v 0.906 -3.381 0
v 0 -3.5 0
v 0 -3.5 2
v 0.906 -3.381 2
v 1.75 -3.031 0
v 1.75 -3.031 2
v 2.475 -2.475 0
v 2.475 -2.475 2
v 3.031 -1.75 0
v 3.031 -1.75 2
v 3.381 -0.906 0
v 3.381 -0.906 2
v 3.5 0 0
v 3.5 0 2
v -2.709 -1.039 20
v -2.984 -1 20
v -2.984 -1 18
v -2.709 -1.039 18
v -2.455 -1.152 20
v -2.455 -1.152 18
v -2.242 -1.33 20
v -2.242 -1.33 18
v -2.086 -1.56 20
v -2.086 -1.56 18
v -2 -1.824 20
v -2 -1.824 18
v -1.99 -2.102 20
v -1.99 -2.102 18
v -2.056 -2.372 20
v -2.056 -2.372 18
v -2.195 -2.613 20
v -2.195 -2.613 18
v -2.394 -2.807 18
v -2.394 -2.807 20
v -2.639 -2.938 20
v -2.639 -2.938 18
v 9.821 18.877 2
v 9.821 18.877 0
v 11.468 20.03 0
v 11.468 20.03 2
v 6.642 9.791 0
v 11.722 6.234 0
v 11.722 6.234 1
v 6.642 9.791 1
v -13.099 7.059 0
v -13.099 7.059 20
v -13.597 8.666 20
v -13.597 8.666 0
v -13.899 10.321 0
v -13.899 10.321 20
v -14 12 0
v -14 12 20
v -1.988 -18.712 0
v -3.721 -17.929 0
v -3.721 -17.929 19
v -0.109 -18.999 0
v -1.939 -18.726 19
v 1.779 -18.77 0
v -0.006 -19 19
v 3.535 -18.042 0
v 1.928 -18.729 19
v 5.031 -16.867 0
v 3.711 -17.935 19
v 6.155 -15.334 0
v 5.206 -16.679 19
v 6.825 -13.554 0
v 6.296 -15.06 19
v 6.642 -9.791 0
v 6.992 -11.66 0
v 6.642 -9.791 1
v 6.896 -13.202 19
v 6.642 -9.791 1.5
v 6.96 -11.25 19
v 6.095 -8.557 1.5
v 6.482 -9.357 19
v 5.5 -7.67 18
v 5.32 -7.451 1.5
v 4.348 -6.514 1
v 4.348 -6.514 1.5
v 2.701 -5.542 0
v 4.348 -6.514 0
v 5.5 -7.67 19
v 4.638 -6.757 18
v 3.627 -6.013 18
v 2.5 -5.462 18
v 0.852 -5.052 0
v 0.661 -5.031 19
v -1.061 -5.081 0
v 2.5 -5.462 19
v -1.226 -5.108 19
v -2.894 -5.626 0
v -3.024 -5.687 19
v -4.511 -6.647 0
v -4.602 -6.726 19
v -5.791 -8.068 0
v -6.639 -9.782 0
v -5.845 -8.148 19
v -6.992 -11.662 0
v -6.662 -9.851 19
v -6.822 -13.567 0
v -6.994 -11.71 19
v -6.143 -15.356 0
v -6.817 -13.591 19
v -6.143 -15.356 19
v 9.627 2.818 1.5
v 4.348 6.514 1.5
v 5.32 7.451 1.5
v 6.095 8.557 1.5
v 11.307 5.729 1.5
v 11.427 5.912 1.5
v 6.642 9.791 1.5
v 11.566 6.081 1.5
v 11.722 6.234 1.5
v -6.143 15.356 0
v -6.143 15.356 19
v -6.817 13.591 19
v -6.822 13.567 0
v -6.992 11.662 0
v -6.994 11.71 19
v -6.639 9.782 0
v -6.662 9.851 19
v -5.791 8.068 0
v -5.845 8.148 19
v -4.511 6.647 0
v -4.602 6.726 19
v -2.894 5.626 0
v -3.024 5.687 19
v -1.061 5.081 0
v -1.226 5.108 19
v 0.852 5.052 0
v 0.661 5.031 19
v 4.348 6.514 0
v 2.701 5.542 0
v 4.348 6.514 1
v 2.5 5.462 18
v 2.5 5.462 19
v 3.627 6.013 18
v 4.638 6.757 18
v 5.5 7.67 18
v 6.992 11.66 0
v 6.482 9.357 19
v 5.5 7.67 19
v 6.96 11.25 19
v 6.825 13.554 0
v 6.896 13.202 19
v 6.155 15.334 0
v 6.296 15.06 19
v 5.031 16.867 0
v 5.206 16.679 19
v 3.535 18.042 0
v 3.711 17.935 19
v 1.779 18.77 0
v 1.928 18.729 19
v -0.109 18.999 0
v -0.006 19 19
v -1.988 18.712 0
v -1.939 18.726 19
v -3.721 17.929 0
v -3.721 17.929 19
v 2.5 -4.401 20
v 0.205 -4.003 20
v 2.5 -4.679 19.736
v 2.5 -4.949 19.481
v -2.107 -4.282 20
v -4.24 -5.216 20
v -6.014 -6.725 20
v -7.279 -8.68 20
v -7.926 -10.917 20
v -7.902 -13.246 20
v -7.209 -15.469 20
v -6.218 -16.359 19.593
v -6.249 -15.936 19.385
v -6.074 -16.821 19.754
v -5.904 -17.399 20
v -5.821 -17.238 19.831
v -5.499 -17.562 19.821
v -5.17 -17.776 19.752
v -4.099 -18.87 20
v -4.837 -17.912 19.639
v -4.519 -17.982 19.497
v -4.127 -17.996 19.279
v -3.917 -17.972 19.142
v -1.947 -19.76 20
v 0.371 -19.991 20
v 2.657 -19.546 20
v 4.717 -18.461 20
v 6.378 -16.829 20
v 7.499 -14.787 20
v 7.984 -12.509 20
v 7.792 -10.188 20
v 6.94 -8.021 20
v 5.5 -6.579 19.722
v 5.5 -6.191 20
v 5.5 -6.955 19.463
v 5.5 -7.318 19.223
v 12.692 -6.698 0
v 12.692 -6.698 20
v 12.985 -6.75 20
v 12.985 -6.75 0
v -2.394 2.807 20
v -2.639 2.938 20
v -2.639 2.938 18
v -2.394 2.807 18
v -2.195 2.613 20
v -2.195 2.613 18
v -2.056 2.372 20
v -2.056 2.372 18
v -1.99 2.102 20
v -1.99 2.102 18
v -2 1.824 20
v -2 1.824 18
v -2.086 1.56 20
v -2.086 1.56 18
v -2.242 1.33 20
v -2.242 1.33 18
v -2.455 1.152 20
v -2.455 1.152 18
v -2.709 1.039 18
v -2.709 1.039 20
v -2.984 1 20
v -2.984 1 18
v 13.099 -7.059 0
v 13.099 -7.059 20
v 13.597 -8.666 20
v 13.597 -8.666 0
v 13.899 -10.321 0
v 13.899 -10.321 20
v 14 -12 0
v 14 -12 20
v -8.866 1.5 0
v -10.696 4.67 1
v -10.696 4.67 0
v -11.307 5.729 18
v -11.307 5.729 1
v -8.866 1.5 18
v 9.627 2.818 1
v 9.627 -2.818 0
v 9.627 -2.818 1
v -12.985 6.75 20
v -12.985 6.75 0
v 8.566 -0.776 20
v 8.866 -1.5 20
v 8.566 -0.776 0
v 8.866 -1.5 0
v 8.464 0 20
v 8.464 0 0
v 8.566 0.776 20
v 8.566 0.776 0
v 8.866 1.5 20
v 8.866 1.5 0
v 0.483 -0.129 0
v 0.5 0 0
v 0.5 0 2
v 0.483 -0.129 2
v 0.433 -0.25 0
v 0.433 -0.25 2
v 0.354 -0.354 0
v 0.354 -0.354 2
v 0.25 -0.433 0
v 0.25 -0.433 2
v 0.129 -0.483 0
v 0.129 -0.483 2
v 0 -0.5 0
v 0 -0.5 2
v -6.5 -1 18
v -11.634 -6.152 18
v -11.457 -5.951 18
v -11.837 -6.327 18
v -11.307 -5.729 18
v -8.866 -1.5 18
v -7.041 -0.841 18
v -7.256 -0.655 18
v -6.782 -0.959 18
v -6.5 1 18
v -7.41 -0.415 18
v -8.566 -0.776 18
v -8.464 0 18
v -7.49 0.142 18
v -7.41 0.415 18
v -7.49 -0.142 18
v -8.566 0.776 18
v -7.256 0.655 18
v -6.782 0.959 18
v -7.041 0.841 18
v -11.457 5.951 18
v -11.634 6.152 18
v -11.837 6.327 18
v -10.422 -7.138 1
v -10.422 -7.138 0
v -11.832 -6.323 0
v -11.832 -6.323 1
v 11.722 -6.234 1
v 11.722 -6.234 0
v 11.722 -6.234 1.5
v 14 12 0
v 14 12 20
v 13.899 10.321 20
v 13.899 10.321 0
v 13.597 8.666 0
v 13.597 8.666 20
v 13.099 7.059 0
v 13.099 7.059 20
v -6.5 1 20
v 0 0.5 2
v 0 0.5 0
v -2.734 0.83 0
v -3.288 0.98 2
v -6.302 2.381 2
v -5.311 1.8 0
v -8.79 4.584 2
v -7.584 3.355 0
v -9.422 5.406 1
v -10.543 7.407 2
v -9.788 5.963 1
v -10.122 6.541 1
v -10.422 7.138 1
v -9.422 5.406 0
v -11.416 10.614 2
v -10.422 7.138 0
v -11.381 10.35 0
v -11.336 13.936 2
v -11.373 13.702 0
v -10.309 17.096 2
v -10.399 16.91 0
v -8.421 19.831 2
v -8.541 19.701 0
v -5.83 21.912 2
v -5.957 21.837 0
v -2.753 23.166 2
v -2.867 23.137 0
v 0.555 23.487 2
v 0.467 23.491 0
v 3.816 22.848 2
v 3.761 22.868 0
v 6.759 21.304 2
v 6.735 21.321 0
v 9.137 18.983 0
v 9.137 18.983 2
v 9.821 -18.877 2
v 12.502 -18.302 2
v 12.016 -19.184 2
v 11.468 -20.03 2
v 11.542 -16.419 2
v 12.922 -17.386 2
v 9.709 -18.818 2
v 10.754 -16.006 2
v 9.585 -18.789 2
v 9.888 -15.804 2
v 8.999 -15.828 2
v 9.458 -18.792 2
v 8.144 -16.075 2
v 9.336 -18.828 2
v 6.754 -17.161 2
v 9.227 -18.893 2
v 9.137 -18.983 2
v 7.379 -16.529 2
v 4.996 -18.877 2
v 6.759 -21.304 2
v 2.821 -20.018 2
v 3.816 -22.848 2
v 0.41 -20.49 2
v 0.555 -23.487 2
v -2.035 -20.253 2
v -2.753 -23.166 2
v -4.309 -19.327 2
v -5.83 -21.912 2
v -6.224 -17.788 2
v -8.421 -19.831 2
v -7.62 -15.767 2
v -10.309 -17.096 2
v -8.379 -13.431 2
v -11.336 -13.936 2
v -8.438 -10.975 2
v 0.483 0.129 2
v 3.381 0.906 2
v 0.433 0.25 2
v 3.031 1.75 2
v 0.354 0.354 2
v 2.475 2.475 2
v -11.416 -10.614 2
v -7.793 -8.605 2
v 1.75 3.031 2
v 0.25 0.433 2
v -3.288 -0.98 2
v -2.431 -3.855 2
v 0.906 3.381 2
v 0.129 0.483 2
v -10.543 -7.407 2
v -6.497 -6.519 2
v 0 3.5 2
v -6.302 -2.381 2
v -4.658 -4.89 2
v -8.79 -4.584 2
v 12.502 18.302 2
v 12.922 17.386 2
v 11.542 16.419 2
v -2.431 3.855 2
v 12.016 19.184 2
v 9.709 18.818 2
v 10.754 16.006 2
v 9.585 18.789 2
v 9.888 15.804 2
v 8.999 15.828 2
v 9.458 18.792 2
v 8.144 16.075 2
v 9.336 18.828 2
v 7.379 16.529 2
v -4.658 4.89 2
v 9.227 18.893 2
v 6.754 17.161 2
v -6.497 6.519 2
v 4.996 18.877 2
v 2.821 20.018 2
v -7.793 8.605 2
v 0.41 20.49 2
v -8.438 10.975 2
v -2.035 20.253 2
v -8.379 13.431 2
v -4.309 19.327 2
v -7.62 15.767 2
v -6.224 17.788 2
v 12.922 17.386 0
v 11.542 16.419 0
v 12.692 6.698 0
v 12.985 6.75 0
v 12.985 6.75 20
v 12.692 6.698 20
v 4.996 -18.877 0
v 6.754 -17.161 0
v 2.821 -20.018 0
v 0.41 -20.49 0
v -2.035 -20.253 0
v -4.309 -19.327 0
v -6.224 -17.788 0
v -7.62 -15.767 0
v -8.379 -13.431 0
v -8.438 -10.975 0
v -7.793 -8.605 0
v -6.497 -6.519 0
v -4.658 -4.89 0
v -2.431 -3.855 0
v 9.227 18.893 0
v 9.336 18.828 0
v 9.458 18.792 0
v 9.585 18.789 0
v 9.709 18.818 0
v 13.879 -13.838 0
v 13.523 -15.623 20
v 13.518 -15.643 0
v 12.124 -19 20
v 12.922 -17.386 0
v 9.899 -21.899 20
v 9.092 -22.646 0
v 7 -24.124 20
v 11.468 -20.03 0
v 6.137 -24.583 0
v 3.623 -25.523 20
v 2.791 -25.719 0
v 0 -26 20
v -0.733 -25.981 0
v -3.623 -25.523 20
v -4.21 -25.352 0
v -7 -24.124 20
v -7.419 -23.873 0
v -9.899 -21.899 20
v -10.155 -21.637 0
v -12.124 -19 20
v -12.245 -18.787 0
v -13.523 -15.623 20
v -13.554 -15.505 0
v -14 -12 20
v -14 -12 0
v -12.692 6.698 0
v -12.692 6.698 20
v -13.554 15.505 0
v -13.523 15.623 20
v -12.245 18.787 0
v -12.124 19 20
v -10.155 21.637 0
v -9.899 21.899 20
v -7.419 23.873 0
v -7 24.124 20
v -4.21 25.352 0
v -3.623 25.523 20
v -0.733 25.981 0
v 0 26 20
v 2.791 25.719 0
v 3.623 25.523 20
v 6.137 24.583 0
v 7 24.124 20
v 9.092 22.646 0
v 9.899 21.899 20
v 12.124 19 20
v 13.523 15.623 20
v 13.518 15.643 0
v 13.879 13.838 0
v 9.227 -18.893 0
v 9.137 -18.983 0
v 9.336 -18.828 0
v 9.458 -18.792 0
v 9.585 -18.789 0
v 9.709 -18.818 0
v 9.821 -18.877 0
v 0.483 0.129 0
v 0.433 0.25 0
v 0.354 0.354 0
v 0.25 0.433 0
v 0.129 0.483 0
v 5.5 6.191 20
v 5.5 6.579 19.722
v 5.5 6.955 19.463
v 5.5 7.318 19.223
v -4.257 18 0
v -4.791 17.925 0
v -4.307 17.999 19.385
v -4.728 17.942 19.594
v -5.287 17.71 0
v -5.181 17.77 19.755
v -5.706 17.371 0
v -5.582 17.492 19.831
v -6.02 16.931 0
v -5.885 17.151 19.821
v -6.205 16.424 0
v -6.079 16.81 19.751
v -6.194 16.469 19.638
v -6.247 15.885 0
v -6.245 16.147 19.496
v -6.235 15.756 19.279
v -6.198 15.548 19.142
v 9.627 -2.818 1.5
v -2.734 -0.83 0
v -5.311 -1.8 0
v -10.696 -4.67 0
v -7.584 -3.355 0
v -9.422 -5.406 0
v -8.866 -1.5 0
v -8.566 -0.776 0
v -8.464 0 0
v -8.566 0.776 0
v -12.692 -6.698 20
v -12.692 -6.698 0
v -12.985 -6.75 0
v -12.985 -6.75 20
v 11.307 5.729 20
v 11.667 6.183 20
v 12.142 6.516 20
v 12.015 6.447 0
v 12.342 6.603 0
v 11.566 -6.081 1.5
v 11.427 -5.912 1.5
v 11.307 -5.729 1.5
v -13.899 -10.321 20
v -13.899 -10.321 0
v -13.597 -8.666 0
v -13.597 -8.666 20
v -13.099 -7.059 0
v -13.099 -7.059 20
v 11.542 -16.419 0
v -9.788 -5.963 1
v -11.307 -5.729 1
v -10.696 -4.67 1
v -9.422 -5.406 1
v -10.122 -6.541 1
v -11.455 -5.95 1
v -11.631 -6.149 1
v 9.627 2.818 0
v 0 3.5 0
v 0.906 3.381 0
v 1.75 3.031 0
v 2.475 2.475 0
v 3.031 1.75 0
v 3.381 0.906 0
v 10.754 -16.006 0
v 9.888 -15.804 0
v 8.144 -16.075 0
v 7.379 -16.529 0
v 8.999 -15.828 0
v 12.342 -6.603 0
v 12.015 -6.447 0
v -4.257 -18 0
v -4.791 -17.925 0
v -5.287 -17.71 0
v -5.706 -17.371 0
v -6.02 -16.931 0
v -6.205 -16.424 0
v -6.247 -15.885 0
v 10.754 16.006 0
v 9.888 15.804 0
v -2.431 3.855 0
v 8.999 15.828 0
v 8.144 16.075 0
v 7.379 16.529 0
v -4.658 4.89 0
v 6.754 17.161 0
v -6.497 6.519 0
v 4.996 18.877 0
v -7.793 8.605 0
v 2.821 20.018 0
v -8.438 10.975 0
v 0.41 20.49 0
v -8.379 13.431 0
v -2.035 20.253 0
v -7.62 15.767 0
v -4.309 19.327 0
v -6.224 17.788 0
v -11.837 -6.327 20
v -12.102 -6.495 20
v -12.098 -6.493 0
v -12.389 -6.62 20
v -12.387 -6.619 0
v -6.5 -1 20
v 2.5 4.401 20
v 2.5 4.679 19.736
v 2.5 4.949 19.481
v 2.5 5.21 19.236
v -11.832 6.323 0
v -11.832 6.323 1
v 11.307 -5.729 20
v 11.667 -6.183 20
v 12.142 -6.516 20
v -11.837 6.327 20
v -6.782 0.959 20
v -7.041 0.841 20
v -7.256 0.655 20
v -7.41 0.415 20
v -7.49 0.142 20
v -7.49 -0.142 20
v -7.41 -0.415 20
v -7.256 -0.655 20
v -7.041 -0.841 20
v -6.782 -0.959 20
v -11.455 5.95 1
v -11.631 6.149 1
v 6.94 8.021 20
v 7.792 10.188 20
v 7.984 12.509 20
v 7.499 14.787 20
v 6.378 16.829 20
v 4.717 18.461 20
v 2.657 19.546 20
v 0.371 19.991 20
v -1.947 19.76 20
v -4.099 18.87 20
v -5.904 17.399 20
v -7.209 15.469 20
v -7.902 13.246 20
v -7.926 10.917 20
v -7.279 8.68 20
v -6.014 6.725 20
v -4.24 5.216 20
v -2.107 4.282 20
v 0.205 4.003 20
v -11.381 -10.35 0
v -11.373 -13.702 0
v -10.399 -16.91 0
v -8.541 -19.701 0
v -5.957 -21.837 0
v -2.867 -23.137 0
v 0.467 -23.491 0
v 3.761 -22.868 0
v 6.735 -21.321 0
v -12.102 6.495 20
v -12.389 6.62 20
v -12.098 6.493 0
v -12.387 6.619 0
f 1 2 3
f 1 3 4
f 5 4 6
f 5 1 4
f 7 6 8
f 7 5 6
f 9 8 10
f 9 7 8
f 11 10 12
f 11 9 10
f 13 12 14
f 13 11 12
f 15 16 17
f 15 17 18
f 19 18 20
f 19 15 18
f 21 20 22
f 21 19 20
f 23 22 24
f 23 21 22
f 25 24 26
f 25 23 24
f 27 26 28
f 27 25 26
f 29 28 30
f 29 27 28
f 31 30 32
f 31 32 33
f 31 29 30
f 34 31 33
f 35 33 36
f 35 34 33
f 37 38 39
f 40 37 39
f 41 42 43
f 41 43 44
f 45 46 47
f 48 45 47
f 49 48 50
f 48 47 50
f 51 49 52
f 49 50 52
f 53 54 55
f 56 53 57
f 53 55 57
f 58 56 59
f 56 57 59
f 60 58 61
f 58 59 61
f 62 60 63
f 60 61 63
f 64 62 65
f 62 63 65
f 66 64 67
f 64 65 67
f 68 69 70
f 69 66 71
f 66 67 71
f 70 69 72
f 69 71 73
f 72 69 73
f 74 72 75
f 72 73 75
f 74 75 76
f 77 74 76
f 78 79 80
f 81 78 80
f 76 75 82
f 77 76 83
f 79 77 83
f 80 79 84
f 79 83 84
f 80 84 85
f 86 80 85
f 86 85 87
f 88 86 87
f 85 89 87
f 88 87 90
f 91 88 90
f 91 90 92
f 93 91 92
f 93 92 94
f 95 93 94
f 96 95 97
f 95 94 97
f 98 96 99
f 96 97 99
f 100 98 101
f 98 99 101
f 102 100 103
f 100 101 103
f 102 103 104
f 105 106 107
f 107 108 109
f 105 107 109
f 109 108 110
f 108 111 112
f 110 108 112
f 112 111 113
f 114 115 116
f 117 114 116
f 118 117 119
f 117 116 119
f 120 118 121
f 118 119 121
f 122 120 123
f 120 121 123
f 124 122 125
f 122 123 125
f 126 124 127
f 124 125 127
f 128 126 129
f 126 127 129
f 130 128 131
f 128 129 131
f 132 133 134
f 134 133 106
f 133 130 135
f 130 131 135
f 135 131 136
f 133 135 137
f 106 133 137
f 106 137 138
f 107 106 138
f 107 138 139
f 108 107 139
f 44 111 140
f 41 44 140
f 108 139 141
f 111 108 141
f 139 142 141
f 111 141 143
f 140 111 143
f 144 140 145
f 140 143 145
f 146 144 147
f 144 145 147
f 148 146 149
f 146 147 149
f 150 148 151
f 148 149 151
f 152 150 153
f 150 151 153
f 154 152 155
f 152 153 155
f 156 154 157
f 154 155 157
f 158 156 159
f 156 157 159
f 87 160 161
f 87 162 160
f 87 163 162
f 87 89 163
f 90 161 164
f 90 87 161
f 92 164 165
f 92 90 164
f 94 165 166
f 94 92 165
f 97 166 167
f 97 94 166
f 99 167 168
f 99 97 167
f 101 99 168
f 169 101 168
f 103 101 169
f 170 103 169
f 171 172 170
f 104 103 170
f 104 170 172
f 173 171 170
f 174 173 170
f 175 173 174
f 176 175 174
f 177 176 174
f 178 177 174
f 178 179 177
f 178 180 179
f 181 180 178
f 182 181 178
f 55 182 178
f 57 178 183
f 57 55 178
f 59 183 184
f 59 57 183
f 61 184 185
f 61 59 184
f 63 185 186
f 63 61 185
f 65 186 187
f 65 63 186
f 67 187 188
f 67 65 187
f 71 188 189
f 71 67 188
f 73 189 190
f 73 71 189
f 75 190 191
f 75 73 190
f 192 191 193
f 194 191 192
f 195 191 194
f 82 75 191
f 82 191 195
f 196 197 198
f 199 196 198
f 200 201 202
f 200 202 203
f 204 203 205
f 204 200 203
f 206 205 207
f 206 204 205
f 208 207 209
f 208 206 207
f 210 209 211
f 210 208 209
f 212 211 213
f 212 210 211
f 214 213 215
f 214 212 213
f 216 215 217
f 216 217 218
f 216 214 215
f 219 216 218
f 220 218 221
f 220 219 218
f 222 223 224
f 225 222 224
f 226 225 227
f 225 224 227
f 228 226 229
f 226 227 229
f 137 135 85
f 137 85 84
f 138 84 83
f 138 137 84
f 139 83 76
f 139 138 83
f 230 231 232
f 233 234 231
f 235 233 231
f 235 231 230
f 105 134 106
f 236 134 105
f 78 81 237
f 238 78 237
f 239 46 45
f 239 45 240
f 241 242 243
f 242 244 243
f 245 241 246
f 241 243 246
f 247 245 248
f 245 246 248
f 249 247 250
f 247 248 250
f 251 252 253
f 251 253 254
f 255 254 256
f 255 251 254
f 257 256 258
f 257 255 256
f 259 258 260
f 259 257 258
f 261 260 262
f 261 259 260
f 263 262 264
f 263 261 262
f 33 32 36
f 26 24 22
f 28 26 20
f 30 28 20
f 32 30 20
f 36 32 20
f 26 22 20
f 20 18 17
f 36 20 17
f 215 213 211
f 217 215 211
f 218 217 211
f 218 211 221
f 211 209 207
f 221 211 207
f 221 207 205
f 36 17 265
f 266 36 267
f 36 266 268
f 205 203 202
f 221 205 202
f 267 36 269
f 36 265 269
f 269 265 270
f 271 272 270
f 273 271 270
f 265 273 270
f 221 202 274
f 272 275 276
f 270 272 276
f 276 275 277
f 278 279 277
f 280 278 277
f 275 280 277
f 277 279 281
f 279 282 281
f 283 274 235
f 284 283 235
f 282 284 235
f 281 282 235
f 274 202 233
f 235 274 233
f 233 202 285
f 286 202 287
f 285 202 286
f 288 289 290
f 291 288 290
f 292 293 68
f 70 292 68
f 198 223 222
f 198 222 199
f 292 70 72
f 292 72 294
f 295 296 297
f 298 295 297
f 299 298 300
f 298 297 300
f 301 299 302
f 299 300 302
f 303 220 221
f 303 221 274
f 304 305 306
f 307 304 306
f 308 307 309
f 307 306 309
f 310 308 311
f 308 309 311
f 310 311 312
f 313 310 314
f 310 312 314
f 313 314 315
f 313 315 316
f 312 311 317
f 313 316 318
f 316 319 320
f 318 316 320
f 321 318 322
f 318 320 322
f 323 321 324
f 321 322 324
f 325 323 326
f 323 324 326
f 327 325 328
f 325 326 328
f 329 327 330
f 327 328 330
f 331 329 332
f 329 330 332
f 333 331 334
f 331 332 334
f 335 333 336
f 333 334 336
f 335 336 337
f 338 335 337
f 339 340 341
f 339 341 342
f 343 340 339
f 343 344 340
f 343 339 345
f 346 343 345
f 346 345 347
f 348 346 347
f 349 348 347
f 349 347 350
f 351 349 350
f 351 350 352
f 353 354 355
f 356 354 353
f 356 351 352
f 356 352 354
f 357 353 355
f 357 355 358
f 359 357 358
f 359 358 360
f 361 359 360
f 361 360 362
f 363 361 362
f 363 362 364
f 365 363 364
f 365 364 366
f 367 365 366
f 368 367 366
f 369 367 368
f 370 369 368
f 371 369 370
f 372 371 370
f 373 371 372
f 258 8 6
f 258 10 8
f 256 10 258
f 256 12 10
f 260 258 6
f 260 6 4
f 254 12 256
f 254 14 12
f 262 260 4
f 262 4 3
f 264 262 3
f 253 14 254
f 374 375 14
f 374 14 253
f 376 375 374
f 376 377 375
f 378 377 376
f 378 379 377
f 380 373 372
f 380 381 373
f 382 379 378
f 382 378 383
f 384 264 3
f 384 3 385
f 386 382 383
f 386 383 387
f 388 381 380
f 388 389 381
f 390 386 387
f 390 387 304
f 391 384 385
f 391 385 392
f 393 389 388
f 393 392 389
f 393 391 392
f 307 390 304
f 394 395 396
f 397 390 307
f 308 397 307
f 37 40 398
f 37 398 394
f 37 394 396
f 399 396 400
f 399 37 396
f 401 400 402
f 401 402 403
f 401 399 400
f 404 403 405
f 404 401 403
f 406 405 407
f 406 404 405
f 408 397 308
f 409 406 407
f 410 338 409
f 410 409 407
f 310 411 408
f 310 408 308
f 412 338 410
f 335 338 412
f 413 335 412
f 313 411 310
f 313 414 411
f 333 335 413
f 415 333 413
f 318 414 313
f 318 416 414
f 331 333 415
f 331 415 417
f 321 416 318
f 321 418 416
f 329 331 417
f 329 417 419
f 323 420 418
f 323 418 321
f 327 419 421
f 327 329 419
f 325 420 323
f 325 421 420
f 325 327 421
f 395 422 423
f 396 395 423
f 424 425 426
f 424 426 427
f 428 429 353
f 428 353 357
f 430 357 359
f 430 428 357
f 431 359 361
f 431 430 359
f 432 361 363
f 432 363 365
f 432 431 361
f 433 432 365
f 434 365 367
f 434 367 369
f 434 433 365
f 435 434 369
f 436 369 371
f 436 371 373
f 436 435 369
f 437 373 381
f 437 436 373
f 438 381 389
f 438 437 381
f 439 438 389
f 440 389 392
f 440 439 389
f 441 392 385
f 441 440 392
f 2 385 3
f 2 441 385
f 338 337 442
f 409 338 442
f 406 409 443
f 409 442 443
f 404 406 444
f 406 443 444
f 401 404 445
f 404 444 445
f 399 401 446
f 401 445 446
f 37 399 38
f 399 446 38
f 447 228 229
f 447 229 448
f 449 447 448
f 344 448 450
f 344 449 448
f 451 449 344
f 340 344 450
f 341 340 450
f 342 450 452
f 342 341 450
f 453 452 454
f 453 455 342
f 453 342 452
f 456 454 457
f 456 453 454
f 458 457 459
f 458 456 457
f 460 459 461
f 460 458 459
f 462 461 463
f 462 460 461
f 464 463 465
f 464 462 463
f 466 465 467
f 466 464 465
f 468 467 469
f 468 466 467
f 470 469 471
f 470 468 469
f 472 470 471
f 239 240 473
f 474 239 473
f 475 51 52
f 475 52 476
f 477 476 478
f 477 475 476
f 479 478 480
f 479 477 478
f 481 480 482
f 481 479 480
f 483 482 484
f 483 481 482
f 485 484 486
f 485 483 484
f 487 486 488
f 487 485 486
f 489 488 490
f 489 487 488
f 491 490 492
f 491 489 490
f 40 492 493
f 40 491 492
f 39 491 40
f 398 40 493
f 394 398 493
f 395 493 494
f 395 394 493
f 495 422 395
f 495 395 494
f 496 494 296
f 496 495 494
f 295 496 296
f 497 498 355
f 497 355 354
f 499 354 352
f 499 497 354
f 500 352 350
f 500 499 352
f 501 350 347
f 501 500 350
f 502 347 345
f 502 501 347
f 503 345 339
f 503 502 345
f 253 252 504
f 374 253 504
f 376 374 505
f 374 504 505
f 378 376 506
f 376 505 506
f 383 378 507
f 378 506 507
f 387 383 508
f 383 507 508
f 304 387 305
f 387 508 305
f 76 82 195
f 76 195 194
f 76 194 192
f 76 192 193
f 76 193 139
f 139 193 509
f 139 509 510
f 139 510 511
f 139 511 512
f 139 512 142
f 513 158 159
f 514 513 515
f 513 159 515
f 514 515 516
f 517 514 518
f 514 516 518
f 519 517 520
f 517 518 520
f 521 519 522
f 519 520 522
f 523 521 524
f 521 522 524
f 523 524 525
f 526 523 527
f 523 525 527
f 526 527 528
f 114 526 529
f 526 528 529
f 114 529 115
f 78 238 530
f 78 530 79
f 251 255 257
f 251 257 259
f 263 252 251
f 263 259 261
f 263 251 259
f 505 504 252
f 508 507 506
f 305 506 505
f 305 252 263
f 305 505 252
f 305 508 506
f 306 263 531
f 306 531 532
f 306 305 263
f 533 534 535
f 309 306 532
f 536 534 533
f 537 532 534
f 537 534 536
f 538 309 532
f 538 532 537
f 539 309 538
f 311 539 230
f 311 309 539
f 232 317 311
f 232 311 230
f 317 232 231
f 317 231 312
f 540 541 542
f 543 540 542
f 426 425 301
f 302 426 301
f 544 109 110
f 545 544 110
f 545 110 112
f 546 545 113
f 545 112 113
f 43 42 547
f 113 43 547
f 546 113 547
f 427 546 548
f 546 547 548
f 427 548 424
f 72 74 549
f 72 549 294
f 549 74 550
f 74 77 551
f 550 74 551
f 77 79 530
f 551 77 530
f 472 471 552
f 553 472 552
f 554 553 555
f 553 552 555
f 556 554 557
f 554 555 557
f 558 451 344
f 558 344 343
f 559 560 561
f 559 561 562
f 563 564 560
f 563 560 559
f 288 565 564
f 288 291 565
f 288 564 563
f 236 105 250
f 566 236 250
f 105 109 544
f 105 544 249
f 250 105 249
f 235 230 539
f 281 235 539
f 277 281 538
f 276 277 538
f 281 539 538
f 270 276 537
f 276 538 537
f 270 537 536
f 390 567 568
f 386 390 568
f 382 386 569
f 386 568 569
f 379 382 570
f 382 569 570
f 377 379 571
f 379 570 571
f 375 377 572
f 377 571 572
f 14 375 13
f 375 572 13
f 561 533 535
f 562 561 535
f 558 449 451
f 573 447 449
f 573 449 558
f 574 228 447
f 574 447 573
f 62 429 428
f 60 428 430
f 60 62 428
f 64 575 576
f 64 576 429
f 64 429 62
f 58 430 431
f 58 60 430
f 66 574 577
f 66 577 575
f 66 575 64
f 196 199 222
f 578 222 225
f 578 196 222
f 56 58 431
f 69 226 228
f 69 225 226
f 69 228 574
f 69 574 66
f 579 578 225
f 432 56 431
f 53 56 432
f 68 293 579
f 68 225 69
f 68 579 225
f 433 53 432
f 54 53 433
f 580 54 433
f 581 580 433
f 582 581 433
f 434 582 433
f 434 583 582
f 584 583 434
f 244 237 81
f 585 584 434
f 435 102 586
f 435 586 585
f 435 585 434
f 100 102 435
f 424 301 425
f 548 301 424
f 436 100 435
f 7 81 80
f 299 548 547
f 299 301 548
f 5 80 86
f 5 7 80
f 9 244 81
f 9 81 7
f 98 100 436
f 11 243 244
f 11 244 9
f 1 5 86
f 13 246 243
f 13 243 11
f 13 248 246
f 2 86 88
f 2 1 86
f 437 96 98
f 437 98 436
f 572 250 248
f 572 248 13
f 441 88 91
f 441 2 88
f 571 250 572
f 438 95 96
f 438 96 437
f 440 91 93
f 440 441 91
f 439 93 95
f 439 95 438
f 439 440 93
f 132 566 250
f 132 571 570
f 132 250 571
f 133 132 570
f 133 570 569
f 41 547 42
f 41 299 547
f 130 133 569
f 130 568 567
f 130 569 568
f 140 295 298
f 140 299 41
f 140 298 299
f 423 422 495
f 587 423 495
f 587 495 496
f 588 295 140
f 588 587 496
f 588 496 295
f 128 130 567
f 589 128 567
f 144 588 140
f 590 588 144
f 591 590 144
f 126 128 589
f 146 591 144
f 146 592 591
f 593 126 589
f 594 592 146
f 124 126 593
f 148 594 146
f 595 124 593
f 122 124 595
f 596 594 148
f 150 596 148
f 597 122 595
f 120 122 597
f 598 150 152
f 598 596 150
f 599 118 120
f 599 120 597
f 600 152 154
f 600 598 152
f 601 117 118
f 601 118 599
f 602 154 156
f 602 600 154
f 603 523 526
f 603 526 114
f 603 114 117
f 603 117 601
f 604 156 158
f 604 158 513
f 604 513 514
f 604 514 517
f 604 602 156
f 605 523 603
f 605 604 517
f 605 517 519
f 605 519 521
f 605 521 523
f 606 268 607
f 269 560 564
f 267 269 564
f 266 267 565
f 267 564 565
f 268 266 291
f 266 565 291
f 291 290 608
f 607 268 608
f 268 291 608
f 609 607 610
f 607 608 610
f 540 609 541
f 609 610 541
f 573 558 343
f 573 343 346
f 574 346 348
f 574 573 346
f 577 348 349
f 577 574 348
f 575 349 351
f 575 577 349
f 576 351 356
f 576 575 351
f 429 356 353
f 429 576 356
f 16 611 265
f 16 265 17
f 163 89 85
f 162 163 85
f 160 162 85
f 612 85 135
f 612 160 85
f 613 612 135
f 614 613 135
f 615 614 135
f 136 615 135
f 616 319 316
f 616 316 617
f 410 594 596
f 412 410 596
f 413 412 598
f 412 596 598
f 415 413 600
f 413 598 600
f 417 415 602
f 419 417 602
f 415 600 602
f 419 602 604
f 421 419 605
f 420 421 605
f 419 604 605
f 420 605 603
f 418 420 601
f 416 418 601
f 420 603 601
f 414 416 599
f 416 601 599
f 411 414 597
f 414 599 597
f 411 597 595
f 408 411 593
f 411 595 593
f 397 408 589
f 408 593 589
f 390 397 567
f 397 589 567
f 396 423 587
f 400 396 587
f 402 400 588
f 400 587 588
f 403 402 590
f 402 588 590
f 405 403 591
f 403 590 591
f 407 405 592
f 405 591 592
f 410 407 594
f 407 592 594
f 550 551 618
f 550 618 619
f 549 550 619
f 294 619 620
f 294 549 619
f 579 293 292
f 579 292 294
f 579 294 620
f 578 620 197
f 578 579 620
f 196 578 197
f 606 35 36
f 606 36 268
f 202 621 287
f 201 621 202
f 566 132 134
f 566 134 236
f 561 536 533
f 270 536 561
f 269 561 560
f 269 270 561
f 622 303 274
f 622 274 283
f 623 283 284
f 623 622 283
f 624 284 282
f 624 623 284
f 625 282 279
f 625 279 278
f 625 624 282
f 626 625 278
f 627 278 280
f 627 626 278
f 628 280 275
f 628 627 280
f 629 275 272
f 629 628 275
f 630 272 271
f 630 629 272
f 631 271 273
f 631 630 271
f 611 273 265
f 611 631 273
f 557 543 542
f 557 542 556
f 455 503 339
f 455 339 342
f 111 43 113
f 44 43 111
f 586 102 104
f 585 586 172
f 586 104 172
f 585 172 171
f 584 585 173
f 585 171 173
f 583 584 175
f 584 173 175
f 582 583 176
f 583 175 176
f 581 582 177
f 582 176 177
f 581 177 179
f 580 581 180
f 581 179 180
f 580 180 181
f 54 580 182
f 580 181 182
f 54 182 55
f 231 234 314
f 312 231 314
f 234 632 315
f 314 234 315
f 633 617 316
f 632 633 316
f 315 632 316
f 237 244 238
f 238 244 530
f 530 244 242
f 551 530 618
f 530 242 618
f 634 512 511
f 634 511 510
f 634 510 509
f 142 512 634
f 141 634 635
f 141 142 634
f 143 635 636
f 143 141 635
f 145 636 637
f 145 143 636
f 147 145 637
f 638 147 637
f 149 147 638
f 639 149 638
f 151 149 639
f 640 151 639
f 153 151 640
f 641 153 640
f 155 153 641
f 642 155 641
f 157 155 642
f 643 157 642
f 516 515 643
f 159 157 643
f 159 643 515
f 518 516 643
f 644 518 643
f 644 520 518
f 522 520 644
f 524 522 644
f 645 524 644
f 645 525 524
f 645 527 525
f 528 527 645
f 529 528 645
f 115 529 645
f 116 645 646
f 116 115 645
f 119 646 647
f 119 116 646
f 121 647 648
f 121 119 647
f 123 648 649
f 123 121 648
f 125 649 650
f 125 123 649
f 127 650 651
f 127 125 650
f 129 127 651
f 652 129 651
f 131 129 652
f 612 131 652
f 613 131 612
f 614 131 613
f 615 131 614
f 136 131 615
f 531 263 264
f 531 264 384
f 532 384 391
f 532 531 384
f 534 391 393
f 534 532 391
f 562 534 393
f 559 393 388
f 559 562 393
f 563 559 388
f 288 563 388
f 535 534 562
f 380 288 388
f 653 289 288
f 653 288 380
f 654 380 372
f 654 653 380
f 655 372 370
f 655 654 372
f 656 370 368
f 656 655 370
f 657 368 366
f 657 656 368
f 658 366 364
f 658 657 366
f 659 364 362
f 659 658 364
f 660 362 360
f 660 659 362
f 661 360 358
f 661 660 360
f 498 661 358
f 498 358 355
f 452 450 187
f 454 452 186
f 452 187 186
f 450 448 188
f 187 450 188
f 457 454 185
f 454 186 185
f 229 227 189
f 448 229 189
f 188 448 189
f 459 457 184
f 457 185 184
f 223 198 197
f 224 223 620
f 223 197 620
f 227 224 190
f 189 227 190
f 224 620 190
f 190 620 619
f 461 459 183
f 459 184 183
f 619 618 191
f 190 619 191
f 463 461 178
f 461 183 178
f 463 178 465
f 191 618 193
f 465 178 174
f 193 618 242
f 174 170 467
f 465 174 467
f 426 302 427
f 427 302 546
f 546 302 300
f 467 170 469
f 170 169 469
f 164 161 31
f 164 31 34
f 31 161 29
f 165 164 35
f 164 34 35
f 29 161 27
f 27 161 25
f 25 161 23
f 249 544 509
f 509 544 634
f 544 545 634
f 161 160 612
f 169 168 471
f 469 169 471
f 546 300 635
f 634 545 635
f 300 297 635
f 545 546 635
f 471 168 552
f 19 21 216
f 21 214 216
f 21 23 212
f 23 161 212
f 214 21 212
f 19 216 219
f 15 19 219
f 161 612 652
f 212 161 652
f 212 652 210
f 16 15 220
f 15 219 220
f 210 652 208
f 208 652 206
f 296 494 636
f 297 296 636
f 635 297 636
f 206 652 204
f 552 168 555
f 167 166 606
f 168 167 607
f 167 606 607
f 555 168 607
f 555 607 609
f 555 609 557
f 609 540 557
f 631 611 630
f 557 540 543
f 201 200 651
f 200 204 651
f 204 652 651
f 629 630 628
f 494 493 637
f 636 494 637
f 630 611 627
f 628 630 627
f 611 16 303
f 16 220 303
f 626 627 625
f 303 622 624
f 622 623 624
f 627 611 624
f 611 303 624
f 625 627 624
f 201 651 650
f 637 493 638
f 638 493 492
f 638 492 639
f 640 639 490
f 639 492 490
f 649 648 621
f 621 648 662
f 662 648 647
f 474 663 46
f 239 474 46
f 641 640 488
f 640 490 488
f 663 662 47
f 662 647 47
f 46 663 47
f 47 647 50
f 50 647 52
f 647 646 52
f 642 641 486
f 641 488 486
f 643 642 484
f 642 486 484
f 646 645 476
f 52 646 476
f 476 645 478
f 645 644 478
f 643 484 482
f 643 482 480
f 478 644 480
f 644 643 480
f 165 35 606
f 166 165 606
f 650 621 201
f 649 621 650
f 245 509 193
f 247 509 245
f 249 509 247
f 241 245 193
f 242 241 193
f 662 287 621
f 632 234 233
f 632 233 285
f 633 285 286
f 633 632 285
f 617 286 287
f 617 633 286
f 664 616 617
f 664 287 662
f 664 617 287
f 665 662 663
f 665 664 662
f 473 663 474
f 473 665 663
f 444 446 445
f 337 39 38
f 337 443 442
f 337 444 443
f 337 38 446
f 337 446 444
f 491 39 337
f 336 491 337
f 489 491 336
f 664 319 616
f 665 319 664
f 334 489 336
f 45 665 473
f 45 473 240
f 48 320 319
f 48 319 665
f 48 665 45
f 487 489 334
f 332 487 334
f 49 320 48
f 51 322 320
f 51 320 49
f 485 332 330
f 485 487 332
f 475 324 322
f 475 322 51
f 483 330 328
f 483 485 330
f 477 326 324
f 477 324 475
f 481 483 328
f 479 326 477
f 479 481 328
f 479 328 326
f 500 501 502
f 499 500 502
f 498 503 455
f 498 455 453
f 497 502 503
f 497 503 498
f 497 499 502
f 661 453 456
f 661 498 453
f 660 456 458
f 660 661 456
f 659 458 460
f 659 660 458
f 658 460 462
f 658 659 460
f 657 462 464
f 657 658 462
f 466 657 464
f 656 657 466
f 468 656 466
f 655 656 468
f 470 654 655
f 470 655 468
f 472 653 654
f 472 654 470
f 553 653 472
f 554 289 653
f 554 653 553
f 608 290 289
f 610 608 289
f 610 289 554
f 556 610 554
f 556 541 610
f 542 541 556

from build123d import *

# Parameters (mm, degrees)
BOSS_EXTRU_1_DEPTH       = 20
ESQUISSE2_R              = 7
ENL_V_MAT_EXTRU_1_DEPTH  = 36.665109
CHANFREIN1_SIZE          = 1
ENL_V_MAT_EXTRU_3_DEPTH  = 36.665109
CONG_1_R                 = 20
ENL_V_MAT_EXTRU_4_DEPTH  = 36.665109168
CONG_2_R                 = 3
CONG_3_R                 = 2
CONG_2_OF_SYM_TRIE1_R    = 3
CONG_3_OF_SYM_TRIE1_R    = 2
ESQUISSE7_W              = 3
ESQUISSE7_H              = 19.363772413
ENL_V_MAT_EXTRU_5_DEPTH  = 2
ESQUISSE8_R              = 2
ENL_V_MAT_EXTRU_6_DEPTH  = 36.665109168
ENL_V_MAT_EXTRU_7_DEPTH  = 2
ENL_V_MAT_EXTRU_8_DEPTH  = 1
ENL_V_MAT_EXTRU_9_DEPTH  = 2
ENL_V_MAT_EXTRU_10_DEPTH = 0.5


with BuildPart() as part:
    # Esquisse1 → Boss.-Extru.1 (new body)
    with BuildSketch(Plane.XY):
        with BuildLine():
            Line((-14, -12), (-14, 12))
            ThreePointArc((-14, 12), (0, 26), (14, 12))
            Line((14, 12), (14, -12))
            ThreePointArc((14, -12), (0, -26), (-14, -12))
        make_face()
    extrude(amount=BOSS_EXTRU_1_DEPTH)

    # Esquisse2 → Enlèv. mat.-Extru.1 (cut, through all)
    with BuildSketch(Plane.XY.offset(20)):
        with Locations((0, 12)):
            Circle(ESQUISSE2_R)
        with Locations((0, -12)):
            Circle(ESQUISSE2_R)
    extrude(amount=-ENL_V_MAT_EXTRU_1_DEPTH, mode=Mode.SUBTRACT)

    # Chanfrein1
    chanfrein1_edges = [part.edges().sort_by_distance(p)[0] for p in [
        (-7, 12, 20),
        (-7, -12, 20),
    ]]
    chamfer(chanfrein1_edges, length=CHANFREIN1_SIZE)

    # Esquisse3 → Enlèv. mat.-Extru.3 (cut, through all)
    with BuildSketch(Plane.XY.offset(20)):
        with BuildLine():
            Line((-14, 12), (-14, -12))
            ThreePointArc((-14, -12), (-12.185143325, -5.106359297), (-7.211102551, 0))
            ThreePointArc((-7.211102551, 0), (-12.185143325, 5.106359297), (-14, 12))
        make_face()
        with BuildLine():
            Line((14, -12), (14, 12))
            ThreePointArc((14, 12), (12.185143325, 5.106359297), (7.211102551, 0))
            ThreePointArc((7.211102551, 0), (12.185143325, -5.106359297), (14, -12))
        make_face()
    extrude(amount=-ENL_V_MAT_EXTRU_3_DEPTH, mode=Mode.SUBTRACT)

    # Congé1
    cong_1_edges = [part.edges().sort_by_distance(p)[0] for p in [
        (7.211102551, 0, 10),
        (-7.211102551, 0, 10),
    ]]
    fillet(cong_1_edges, radius=CONG_1_R)

    # Esquisse6 → Enlèv. mat.-Extru.4 (cut, through all)
    with BuildSketch(Plane.XY.offset(20)):
        Polygon((-12.985436878, 6.75), (-11.773762969, 6.536349198), (-8, 0), (-11.773762969, -6.536349198), (-12.985436878, -6.75), align=None)
    enl_v_mat_extru_4 = extrude(amount=-ENL_V_MAT_EXTRU_4_DEPTH, mode=Mode.SUBTRACT)

    # Congé2
    cong_2_edges = [part.edges().sort_by_distance(p)[0] for p in [
        (-8, 0, 10),
    ]]
    fillet(cong_2_edges, radius=CONG_2_R)

    # Congé3
    cong_3_edges = [part.edges().sort_by_distance(p)[0] for p in [
        (-11.773762969, 6.536349198, 10),
        (-11.773762969, -6.536349198, 10),
    ]]
    fillet(cong_3_edges, radius=CONG_3_R)

    # Symétrie1: Enlèv. mat.-Extru.4 across plane
    add(enl_v_mat_extru_4.mirror(Plane(origin=(0, 0, 0), x_dir=(0, 0, 1), z_dir=(1, 0, 0))), mode=Mode.SUBTRACT)

    # Congé2 of Symétrie1
    cong_2_of_sym_trie1_edges = [part.edges().sort_by_distance(p)[0] for p in [
        (8, 0, 10),
    ]]
    fillet(cong_2_of_sym_trie1_edges, radius=CONG_2_OF_SYM_TRIE1_R)

    # Congé3 of Symétrie1
    cong_3_of_sym_trie1_edges = [part.edges().sort_by_distance(p)[0] for p in [
        (11.773762969, 6.536349198, 10),
        (11.773762969, -6.536349198, 10),
    ]]
    fillet(cong_3_of_sym_trie1_edges, radius=CONG_3_OF_SYM_TRIE1_R)

    # Esquisse7 → Enlèv. mat.-Extru.5 (cut)
    with BuildSketch(Plane.XY.offset(20)):
        with Locations((4, -0.240073956)):
            Rectangle(ESQUISSE7_W, ESQUISSE7_H)
    extrude(amount=-ENL_V_MAT_EXTRU_5_DEPTH, mode=Mode.SUBTRACT)

    # Esquisse8 → Enlèv. mat.-Extru.6 (cut, through all)
    with BuildSketch(Plane.XY.offset(20)):
        with Locations((-4.25, 16)):
            Circle(ESQUISSE8_R)
        with Locations((-4.25, -16)):
            Circle(ESQUISSE8_R)
    extrude(amount=-ENL_V_MAT_EXTRU_6_DEPTH, mode=Mode.SUBTRACT)

    # Esquisse9 → Enlèv. mat.-Extru.7 (cut)
    with BuildSketch(Plane.XY.offset(20)):
        with BuildLine():
            Line((-12.985436878, 6.75), (-2.638783858, 2.938351237))
            ThreePointArc((-2.638783858, 2.938351237), (-2, 1.824431263), (-2.984467175, 1))
            Line((-2.984467175, 1), (-6.5, 1))
            ThreePointArc((-6.5, 1), (-7.5, 0), (-6.5, -1))
            Line((-6.5, -1), (-2.984467175, -1))
            ThreePointArc((-2.984467175, -1), (-2, -1.824431263), (-2.638783858, -2.938351237))
            Line((-2.638783858, -2.938351237), (-12.985436878, -6.75))
            Line((-12.985436878, -6.75), (-12.985436878, 6.75))
        make_face()
    extrude(amount=-ENL_V_MAT_EXTRU_7_DEPTH, mode=Mode.SUBTRACT)

    # Esquisse10 → Enlèv. mat.-Extru.8 (cut)
    with BuildSketch(Plane(origin=(0, 0, 0), x_dir=(-1, 0, 0), z_dir=(0, 0, -1))):
        Polygon((-14.880645038, 4.022009348), (-5.050820507, 10.904926585), (-2.756514761, 7.628318408), (-12.586339293, 0.745401171), align=None)
        Polygon((14.104417015, 2.702110502), (8.18518219, 6.119582321), (9.18518219, 7.851633128), (15.104417015, 4.434161309), align=None)
    enl_v_mat_extru_8 = extrude(amount=-ENL_V_MAT_EXTRU_8_DEPTH, mode=Mode.SUBTRACT)

    # Symétrie2: Enlèv. mat.-Extru.8 across plane
    add(enl_v_mat_extru_8.mirror(Plane.ZX), mode=Mode.SUBTRACT)

    # Esquisse11 → Enlèv. mat.-Extru.9 (cut)
    with BuildSketch(Plane(origin=(0, 0, 0), x_dir=(-1, 0, 0), z_dir=(0, 0, -1))):
        with BuildLine():
            Line((-9.821287991, 18.876939886), (-11.46812862, 20.030070109))
            Line((-11.46812862, 20.030070109), (-13.322410066, 19.286515908))
            Line((-13.322410066, 19.286515908), (-12.922465041, 17.386083667))
            Line((-12.922465041, 17.386083667), (-11.5420173, 16.419483753))
            ThreePointArc((-11.5420173, 16.419483753), (-8.998687611, 15.827772592), (-6.753604006, 17.161282102))
            ThreePointArc((-6.753604006, 17.161282102), (7.619740739, 15.766902052), (0, 3.5))
            ThreePointArc((0, 3.5), (-2.474873734, 2.474873734), (-3.5, 0))
            Line((-3.5, 0), (-0.5, 0))
            ThreePointArc((-0.5, 0), (-0.353553391, 0.353553391), (0, 0.5))
            ThreePointArc((0, 0.5), (10.309061, 17.096396894), (-9.137228949, 18.982911079))
            ThreePointArc((-9.137228949, 18.982911079), (-9.457955178, 18.79240972), (-9.821287991, 18.876939886))
        make_face()
    enl_v_mat_extru_9 = extrude(amount=-ENL_V_MAT_EXTRU_9_DEPTH, mode=Mode.SUBTRACT)

    # Esquisse12 → Enlèv. mat.-Extru.10 (cut)
    with BuildSketch(Plane(origin=(0, 0, 1), x_dir=(-1, 0, 0), z_dir=(0, 0, -1))):
        Polygon((-11.722201386, 6.233575403), (-6.642191838, 9.790636383), (-4.347886092, 6.514028206), (-9.626796974, 2.817695012), align=None)
        Polygon((-9.626796974, -2.817695012), (-4.347886092, -6.514028206), (-6.642191838, -9.790636383), (-11.722201386, -6.233575403), align=None)
    extrude(amount=-ENL_V_MAT_EXTRU_10_DEPTH, mode=Mode.SUBTRACT)

    # Symétrie3: Enlèv. mat.-Extru.9 across plane
    add(enl_v_mat_extru_9.mirror(Plane.ZX), mode=Mode.SUBTRACT)


solid = part.part
